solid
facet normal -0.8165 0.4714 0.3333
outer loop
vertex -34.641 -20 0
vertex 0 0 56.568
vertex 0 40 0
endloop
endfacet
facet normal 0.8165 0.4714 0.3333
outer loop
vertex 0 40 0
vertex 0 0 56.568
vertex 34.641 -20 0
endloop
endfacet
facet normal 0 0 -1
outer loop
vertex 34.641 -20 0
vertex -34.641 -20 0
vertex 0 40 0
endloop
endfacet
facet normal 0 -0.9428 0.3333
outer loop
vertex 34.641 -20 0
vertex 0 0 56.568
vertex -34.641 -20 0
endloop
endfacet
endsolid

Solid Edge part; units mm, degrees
sketch "Sketch1" plane through (0, 0, 0) normal (0, 0, 1) x (1, 0, 0)
  line L0 (34.641, -20) -> (0, 40)
  line L1 (0, 40) -> (-34.641, -20)
  line L2 (-34.641, -20) -> (34.641, -20)
  dimension "D1" = 60
extrude "Protrusion1" add sketch "Sketch1" along normal up to vertex (56.5685 mm away)
sketch "Sketch2" plane through (0, 0, 0) normal (1, 0, 0) x (0, 1, 0)
  line L0 (-20, 0) -> (0, 56.5685)
extrude "Cutout1" cut sketch "Sketch2" along normal mid plane 391.7611 material side at (0, -10.0471, 28.3009)
pattern_circular "Pattern1" count 3 over 360 about axis through (0, 0, 0) along (0, 0, -1) of "Cutout1"
